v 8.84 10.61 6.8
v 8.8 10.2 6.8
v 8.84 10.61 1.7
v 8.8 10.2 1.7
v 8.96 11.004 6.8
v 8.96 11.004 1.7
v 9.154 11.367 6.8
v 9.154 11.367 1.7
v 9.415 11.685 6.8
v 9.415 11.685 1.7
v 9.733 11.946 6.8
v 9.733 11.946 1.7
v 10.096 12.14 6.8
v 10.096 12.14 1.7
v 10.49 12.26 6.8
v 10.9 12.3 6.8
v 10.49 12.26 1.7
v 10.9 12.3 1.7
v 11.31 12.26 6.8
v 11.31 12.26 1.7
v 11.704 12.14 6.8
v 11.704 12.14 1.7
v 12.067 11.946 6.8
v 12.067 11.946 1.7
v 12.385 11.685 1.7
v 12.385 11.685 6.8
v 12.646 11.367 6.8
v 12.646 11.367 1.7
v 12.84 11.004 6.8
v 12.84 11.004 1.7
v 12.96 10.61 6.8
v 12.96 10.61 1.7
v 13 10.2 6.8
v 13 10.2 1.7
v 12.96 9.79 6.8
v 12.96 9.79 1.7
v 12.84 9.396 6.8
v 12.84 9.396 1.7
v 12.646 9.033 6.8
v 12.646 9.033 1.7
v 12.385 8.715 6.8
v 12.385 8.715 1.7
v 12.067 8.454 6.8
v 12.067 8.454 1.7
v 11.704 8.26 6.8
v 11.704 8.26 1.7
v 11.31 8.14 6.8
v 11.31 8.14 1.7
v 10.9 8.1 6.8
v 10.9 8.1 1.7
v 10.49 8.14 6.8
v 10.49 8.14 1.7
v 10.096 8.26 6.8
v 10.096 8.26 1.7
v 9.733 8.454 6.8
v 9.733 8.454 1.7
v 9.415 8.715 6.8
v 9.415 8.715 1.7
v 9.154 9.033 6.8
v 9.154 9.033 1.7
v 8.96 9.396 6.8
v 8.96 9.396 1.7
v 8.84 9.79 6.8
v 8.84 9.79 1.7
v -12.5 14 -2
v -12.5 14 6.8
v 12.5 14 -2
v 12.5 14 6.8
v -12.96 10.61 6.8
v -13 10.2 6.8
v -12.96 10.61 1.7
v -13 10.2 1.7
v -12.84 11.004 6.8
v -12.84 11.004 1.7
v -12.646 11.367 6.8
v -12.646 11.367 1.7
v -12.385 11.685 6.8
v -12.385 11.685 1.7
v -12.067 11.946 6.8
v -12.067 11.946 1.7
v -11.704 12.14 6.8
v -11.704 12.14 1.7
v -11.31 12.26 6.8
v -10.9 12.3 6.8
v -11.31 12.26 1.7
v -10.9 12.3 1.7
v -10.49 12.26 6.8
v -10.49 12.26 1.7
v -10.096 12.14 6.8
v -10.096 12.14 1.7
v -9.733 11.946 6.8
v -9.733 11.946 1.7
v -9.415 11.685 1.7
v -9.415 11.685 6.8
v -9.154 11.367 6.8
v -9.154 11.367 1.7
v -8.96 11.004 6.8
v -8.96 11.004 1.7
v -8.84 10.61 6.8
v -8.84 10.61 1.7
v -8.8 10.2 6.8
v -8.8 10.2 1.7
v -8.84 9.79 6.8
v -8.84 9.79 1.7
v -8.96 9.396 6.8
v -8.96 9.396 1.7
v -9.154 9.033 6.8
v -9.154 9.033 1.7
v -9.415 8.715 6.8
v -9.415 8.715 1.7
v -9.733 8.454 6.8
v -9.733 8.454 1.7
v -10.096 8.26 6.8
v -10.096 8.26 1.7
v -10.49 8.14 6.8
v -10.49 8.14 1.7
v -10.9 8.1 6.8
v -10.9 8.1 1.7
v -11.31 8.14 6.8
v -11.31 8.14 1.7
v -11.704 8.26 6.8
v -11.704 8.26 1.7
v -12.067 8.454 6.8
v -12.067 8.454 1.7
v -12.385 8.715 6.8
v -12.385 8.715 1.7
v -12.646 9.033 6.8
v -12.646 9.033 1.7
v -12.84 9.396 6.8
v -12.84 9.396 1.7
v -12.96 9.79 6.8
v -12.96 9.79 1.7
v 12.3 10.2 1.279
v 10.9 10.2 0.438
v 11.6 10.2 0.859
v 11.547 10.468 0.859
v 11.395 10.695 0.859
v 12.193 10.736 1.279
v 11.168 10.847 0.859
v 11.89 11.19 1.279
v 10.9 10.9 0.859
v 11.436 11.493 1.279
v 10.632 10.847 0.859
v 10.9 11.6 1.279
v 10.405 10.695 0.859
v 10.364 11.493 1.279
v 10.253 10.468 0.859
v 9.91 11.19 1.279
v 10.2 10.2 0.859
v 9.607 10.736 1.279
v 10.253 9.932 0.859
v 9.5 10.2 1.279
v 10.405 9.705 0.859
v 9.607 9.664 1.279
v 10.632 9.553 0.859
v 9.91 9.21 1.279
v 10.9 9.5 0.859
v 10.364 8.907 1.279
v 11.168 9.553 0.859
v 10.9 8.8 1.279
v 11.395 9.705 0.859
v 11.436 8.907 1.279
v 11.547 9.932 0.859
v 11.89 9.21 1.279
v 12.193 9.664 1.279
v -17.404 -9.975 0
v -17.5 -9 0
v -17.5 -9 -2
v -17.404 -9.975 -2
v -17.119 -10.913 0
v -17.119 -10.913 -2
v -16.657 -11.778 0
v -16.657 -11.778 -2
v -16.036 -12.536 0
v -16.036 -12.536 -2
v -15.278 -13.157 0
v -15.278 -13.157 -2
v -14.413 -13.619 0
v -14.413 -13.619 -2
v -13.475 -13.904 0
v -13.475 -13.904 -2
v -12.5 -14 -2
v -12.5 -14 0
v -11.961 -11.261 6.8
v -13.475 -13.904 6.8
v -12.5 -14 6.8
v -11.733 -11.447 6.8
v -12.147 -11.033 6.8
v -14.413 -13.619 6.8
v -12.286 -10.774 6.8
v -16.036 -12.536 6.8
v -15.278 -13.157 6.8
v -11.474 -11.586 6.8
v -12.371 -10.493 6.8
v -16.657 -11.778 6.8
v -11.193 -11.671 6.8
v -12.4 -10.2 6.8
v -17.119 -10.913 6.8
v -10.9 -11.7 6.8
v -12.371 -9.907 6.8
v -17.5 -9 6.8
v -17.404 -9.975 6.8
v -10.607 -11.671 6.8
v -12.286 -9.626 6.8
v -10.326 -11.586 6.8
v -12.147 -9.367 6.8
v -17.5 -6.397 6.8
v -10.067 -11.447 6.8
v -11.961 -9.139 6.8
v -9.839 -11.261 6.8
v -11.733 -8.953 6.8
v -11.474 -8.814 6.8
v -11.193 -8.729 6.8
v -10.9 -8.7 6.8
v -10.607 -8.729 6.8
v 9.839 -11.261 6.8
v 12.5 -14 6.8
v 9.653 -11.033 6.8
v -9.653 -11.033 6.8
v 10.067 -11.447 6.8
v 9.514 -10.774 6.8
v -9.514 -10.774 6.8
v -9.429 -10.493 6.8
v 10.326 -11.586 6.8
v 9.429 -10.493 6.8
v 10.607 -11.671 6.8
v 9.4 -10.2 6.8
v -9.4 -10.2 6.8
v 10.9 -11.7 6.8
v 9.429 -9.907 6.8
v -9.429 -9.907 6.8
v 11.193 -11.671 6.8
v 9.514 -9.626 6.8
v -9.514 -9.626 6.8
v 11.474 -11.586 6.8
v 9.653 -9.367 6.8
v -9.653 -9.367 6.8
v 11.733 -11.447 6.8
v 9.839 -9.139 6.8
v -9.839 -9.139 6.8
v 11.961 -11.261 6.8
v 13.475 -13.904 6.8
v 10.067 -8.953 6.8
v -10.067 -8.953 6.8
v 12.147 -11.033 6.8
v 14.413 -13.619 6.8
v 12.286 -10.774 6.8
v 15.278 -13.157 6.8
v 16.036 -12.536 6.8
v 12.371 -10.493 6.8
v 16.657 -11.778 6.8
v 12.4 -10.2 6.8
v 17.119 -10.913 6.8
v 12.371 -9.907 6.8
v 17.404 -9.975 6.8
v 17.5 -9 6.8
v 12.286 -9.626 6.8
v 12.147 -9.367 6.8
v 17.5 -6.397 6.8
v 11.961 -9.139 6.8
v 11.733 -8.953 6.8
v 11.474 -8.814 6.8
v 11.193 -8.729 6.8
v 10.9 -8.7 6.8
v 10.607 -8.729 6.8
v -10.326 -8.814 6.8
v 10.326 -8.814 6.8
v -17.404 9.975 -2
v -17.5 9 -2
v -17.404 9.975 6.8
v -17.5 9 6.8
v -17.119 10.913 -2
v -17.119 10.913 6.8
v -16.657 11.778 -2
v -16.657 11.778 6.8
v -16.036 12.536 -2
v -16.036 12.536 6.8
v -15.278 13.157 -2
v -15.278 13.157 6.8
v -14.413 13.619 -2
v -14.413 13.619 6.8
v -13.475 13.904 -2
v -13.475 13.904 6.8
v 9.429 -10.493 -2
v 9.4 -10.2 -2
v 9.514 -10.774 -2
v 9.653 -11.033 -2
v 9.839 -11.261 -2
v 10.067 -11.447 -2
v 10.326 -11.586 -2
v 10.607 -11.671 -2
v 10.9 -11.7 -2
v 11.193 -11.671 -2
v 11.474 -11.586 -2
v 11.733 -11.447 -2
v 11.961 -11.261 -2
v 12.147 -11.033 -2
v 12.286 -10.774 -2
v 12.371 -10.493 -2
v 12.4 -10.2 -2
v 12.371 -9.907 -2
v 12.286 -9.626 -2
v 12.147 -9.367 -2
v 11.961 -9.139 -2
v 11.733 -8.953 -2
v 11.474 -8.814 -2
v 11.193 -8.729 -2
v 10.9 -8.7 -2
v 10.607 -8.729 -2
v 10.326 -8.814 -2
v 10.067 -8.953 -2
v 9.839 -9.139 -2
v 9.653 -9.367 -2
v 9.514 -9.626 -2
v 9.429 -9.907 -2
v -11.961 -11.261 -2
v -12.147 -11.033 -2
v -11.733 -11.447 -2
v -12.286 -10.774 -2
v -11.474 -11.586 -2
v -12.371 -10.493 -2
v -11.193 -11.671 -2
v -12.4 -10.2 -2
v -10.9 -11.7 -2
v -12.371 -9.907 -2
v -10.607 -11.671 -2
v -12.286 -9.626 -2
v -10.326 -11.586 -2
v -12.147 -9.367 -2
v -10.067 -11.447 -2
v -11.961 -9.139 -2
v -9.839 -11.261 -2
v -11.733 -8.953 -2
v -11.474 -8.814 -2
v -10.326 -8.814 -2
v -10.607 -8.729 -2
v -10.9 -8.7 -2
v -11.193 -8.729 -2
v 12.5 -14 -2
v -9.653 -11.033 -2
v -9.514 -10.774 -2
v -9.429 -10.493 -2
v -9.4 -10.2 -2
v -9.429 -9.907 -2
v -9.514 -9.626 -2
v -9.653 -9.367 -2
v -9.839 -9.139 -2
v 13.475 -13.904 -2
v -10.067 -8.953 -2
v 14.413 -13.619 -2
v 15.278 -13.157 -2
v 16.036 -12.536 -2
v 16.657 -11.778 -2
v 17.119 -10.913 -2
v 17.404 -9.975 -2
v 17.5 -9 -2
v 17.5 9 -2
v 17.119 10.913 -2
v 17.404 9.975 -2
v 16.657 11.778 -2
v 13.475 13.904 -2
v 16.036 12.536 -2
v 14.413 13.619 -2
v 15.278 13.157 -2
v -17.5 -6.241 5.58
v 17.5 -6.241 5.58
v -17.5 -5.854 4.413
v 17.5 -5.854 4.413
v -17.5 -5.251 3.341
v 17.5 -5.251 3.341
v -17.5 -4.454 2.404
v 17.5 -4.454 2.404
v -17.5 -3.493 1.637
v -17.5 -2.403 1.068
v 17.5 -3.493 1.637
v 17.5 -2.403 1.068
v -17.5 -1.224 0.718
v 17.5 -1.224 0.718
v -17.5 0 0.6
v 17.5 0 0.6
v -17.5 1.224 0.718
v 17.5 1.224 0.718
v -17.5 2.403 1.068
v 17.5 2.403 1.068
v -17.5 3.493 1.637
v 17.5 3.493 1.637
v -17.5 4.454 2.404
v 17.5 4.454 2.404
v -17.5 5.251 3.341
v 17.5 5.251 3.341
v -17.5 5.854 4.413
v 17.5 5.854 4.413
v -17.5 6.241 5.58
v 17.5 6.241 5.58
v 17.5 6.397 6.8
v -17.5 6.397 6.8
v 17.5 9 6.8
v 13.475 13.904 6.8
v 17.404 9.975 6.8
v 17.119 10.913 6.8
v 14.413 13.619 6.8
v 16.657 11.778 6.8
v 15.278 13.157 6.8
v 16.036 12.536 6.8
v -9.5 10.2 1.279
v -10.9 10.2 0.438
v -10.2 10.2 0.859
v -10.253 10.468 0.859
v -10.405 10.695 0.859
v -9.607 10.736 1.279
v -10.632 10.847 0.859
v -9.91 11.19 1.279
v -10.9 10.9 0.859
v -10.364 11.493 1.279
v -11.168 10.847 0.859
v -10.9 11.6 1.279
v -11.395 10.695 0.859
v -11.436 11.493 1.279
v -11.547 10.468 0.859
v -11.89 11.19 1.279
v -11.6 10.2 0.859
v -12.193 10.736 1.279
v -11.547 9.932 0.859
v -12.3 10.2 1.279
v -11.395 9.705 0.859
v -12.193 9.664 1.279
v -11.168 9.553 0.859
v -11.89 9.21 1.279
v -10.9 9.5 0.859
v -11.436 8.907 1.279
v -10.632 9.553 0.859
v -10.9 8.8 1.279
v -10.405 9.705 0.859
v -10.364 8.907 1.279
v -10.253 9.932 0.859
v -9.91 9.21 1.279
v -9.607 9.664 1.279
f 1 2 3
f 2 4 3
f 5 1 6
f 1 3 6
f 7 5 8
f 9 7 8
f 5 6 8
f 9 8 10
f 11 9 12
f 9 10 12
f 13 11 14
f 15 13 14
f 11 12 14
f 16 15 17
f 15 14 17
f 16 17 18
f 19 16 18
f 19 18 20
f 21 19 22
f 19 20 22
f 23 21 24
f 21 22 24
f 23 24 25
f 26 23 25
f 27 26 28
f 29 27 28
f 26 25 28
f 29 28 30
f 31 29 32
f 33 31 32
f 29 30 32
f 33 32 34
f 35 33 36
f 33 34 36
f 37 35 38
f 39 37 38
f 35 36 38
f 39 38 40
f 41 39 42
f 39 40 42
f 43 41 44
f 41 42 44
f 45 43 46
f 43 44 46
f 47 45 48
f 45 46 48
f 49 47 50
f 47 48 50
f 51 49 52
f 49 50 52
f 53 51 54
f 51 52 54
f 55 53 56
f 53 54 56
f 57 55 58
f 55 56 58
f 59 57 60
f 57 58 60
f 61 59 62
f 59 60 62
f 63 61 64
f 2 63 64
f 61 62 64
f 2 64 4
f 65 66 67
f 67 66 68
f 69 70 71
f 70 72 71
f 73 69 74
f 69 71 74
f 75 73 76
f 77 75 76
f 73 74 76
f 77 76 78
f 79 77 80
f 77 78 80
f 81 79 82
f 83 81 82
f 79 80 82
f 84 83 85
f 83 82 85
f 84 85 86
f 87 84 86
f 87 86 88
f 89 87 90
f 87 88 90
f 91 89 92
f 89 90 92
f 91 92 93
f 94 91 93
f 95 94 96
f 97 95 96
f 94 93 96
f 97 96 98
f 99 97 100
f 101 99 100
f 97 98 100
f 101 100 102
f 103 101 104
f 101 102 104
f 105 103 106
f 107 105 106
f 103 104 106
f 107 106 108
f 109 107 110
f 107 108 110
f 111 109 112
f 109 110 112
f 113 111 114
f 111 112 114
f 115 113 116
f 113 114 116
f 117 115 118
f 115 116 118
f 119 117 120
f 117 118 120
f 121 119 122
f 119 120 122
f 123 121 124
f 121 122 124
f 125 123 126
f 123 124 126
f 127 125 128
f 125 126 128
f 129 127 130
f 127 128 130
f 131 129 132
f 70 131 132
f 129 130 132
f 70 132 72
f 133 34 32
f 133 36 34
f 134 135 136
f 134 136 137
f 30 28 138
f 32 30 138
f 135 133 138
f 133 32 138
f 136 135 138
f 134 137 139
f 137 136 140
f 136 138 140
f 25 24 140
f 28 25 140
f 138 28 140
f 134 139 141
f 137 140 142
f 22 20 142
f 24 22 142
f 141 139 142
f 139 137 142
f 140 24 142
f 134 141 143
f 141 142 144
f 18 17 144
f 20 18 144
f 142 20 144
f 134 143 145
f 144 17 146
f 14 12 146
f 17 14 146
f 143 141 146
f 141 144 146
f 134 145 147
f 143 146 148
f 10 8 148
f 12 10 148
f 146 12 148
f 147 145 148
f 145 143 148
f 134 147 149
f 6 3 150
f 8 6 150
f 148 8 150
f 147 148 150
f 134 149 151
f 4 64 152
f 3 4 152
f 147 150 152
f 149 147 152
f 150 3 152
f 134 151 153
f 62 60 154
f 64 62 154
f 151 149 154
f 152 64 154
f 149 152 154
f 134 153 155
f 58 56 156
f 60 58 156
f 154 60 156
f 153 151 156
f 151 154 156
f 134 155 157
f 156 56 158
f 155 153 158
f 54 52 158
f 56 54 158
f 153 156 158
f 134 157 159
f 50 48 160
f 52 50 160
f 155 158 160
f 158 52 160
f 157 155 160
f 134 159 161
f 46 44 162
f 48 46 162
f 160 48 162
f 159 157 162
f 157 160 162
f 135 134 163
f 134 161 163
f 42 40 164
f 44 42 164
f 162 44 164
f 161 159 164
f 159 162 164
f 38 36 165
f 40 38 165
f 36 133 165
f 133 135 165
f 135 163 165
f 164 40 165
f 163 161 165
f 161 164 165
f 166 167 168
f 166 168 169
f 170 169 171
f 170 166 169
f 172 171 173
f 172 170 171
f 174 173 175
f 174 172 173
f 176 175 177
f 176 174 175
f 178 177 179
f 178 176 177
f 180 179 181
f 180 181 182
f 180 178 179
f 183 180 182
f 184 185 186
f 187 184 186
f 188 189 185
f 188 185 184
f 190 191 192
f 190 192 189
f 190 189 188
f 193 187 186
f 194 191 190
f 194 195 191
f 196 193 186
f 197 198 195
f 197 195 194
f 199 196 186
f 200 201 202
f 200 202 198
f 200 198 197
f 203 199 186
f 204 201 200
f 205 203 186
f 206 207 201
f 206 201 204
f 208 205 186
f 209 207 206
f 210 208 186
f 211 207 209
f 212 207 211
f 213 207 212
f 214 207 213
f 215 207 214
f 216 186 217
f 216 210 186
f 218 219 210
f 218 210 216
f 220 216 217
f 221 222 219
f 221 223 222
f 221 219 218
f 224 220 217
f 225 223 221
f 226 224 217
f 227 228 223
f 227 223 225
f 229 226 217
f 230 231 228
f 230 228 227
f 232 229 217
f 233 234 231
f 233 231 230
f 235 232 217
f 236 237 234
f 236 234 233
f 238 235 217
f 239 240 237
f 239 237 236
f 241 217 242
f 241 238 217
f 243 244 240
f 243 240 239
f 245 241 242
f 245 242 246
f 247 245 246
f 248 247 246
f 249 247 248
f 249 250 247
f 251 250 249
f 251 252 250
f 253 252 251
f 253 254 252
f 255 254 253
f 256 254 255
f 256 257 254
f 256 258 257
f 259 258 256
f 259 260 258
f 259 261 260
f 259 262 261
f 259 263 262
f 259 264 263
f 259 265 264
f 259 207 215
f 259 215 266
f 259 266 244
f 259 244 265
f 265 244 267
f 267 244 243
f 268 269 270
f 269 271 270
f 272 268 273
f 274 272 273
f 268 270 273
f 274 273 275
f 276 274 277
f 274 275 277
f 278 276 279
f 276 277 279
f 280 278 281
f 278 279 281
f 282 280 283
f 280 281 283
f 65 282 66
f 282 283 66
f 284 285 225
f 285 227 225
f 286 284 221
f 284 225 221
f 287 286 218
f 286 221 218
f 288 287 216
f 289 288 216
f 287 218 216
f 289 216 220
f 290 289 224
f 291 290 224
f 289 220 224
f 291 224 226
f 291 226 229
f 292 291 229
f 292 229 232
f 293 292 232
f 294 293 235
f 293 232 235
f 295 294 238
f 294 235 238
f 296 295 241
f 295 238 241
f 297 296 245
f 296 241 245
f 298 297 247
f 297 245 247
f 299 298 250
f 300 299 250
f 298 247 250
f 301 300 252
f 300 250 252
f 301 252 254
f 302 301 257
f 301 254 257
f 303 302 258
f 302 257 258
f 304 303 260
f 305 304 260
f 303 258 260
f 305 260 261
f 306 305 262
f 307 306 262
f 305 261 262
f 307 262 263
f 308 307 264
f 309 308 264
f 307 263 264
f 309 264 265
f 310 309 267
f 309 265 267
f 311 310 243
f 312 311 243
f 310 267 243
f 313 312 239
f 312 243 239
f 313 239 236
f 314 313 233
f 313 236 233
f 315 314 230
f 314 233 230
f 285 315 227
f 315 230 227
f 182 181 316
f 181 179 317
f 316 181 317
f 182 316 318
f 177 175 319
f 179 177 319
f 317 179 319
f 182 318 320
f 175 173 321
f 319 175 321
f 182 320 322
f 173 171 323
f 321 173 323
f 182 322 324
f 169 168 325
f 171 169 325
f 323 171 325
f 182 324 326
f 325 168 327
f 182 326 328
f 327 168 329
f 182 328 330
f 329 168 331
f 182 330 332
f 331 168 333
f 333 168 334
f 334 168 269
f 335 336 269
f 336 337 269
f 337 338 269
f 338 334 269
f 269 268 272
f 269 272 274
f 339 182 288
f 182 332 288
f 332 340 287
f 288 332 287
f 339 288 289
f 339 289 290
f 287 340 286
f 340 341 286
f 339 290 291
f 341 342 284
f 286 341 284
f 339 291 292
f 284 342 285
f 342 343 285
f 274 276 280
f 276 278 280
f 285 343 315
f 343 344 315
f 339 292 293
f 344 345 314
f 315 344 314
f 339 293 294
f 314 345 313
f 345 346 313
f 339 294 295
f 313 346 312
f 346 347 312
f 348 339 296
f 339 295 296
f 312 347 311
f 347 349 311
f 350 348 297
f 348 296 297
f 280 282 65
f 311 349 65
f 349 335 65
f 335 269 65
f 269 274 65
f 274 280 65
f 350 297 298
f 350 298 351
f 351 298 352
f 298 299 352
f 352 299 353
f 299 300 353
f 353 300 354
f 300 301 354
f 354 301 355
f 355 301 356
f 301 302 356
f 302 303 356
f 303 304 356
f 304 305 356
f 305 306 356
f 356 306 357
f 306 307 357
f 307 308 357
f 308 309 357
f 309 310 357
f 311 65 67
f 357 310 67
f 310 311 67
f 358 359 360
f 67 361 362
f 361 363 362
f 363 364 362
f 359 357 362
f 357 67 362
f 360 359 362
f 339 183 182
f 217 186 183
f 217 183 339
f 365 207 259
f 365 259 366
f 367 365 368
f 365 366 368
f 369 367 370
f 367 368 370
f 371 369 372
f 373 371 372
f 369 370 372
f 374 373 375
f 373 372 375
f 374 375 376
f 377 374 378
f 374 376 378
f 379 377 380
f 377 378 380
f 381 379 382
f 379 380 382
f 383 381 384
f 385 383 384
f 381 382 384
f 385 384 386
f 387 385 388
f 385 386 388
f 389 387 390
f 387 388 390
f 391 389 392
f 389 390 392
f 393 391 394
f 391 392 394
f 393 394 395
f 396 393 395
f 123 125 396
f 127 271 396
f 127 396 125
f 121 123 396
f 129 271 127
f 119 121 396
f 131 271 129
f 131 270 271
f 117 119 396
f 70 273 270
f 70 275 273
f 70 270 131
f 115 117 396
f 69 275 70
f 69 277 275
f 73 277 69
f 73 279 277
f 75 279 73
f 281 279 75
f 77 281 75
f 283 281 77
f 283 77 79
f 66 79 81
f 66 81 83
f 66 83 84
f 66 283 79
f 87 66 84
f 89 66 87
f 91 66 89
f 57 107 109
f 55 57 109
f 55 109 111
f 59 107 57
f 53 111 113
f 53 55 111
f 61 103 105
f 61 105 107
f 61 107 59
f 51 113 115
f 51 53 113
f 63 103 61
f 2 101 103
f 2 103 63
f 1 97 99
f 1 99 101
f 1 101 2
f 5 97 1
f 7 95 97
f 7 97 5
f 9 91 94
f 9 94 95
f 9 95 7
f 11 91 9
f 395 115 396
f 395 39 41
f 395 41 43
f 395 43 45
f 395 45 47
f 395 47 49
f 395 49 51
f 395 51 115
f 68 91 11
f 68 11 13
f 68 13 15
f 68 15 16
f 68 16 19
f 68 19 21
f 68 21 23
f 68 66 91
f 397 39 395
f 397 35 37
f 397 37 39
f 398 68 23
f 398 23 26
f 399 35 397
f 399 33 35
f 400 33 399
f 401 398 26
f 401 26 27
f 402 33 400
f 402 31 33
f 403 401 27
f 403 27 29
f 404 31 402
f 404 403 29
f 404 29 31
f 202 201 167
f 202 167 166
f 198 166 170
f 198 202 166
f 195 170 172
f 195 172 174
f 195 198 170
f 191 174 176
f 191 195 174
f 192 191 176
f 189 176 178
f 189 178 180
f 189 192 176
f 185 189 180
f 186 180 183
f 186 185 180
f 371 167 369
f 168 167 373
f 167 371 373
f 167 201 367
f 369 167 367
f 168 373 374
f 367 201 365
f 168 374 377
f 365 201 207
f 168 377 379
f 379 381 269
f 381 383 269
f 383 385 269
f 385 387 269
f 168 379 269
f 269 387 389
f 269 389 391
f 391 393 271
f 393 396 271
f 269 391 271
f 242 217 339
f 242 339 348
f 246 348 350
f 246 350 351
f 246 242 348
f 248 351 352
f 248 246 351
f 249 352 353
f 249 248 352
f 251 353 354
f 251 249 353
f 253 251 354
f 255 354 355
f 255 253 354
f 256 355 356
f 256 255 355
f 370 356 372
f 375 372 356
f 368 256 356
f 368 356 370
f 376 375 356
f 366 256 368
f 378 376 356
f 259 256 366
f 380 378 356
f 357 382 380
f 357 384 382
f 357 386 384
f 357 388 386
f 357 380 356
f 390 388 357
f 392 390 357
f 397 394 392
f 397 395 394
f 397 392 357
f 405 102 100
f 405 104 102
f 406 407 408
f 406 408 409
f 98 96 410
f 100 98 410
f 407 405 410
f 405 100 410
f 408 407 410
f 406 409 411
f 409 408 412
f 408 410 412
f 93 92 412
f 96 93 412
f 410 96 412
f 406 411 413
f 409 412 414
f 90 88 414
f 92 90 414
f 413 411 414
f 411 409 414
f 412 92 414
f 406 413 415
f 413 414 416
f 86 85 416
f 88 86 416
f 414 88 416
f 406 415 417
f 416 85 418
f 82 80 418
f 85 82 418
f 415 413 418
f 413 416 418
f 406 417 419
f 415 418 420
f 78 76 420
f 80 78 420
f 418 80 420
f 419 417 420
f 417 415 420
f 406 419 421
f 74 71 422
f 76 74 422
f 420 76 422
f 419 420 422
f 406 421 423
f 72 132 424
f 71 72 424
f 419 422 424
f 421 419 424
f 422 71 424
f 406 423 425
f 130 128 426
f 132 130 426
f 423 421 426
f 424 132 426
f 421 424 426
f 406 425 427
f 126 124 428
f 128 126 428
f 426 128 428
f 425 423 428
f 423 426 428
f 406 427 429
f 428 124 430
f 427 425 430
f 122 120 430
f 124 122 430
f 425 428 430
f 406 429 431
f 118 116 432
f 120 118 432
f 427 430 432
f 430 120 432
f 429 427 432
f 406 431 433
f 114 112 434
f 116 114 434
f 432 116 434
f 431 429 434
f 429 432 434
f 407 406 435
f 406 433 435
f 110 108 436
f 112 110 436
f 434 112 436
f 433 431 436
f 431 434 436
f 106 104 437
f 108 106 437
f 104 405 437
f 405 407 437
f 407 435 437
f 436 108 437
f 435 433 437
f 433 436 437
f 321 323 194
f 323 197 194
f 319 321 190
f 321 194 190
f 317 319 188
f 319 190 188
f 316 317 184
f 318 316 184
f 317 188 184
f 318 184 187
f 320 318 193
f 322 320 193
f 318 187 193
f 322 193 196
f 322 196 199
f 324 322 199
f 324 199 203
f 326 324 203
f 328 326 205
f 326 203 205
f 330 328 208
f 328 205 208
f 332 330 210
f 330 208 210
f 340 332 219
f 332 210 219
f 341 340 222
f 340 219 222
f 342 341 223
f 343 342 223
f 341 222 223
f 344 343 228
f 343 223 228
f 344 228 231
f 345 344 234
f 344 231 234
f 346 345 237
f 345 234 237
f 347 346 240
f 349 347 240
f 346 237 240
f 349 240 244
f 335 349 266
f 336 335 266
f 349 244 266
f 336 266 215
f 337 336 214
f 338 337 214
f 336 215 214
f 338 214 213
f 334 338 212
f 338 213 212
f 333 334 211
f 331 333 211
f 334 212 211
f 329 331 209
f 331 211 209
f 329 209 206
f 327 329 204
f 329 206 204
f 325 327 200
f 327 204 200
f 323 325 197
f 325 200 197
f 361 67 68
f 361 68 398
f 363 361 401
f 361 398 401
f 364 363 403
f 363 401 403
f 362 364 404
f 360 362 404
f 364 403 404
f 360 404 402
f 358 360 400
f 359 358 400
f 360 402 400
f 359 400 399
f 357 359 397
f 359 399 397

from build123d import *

# Parameters (mm, degrees)
F0_W     = 35
F0_H     = 28
F1_DEPTH = 14
F3_D     = 12.8
F4_DEPTH = 7.2
F5_R     = 5
F6_D     = 3
F8_D     = 4.2
F8_DEPTH = 5.1
F8_TIP   = 1.2618073
F9_DEPTH = 2


with BuildPart() as f1:
    # F0 (on Top) → F1 (new body)
    with BuildSketch(Plane.XY):
        Rectangle(F0_W, F0_H)
    extrude(amount=F1_DEPTH)

    # F3 (through all)
    with Locations(Plane(origin=(-17.5, 0, 0), x_dir=(0, -1, 0), z_dir=(-1, 0, 0))):
        with Locations((0, 7)):
            Hole(F3_D / 2)

    # F4 (cut): a face of the model
    f4_faces = [f1.faces().sort_by_distance(p)[0] for p in [
        (0, 0, 14),
    ]]
    extrude(f4_faces, amount=-F4_DEPTH, mode=Mode.SUBTRACT)

    # F5
    f5_edges = [f1.edges().sort_by_distance(p)[0] for p in [
        (17.5, 14, 3.4),
        (-17.5, 14, 3.4),
        (17.5, -14, 3.4),
        (-17.5, -14, 3.4),
    ]]
    fillet(f5_edges, radius=F5_R)

    # F6 (through all)
    with Locations(Plane(origin=(0, 0, 0), x_dir=(1, 0, 0), z_dir=(0, 0, -1))):
        with Locations((10.9, 10.2), (-10.9, 10.2)):
            Hole(F6_D / 2)

    # F8
    with Locations(Plane.XY.offset(6.8)):
        with Locations((-10.9, 10.2), (10.9, 10.2)):
            Hole(F8_D / 2, depth=F8_DEPTH)
            with Locations((0, 0, -(F8_DEPTH + F8_TIP / 2))):  # 118° drill point
                Cone(0, F8_D / 2, F8_TIP, mode=Mode.SUBTRACT)

    # F9 (add): a face of the model
    f9_faces = [f1.faces().sort_by_distance(p)[0] for p in [
        (0, 0.15268816, 0),
    ]]
    extrude(f9_faces, amount=F9_DEPTH)


solid = f1.part
